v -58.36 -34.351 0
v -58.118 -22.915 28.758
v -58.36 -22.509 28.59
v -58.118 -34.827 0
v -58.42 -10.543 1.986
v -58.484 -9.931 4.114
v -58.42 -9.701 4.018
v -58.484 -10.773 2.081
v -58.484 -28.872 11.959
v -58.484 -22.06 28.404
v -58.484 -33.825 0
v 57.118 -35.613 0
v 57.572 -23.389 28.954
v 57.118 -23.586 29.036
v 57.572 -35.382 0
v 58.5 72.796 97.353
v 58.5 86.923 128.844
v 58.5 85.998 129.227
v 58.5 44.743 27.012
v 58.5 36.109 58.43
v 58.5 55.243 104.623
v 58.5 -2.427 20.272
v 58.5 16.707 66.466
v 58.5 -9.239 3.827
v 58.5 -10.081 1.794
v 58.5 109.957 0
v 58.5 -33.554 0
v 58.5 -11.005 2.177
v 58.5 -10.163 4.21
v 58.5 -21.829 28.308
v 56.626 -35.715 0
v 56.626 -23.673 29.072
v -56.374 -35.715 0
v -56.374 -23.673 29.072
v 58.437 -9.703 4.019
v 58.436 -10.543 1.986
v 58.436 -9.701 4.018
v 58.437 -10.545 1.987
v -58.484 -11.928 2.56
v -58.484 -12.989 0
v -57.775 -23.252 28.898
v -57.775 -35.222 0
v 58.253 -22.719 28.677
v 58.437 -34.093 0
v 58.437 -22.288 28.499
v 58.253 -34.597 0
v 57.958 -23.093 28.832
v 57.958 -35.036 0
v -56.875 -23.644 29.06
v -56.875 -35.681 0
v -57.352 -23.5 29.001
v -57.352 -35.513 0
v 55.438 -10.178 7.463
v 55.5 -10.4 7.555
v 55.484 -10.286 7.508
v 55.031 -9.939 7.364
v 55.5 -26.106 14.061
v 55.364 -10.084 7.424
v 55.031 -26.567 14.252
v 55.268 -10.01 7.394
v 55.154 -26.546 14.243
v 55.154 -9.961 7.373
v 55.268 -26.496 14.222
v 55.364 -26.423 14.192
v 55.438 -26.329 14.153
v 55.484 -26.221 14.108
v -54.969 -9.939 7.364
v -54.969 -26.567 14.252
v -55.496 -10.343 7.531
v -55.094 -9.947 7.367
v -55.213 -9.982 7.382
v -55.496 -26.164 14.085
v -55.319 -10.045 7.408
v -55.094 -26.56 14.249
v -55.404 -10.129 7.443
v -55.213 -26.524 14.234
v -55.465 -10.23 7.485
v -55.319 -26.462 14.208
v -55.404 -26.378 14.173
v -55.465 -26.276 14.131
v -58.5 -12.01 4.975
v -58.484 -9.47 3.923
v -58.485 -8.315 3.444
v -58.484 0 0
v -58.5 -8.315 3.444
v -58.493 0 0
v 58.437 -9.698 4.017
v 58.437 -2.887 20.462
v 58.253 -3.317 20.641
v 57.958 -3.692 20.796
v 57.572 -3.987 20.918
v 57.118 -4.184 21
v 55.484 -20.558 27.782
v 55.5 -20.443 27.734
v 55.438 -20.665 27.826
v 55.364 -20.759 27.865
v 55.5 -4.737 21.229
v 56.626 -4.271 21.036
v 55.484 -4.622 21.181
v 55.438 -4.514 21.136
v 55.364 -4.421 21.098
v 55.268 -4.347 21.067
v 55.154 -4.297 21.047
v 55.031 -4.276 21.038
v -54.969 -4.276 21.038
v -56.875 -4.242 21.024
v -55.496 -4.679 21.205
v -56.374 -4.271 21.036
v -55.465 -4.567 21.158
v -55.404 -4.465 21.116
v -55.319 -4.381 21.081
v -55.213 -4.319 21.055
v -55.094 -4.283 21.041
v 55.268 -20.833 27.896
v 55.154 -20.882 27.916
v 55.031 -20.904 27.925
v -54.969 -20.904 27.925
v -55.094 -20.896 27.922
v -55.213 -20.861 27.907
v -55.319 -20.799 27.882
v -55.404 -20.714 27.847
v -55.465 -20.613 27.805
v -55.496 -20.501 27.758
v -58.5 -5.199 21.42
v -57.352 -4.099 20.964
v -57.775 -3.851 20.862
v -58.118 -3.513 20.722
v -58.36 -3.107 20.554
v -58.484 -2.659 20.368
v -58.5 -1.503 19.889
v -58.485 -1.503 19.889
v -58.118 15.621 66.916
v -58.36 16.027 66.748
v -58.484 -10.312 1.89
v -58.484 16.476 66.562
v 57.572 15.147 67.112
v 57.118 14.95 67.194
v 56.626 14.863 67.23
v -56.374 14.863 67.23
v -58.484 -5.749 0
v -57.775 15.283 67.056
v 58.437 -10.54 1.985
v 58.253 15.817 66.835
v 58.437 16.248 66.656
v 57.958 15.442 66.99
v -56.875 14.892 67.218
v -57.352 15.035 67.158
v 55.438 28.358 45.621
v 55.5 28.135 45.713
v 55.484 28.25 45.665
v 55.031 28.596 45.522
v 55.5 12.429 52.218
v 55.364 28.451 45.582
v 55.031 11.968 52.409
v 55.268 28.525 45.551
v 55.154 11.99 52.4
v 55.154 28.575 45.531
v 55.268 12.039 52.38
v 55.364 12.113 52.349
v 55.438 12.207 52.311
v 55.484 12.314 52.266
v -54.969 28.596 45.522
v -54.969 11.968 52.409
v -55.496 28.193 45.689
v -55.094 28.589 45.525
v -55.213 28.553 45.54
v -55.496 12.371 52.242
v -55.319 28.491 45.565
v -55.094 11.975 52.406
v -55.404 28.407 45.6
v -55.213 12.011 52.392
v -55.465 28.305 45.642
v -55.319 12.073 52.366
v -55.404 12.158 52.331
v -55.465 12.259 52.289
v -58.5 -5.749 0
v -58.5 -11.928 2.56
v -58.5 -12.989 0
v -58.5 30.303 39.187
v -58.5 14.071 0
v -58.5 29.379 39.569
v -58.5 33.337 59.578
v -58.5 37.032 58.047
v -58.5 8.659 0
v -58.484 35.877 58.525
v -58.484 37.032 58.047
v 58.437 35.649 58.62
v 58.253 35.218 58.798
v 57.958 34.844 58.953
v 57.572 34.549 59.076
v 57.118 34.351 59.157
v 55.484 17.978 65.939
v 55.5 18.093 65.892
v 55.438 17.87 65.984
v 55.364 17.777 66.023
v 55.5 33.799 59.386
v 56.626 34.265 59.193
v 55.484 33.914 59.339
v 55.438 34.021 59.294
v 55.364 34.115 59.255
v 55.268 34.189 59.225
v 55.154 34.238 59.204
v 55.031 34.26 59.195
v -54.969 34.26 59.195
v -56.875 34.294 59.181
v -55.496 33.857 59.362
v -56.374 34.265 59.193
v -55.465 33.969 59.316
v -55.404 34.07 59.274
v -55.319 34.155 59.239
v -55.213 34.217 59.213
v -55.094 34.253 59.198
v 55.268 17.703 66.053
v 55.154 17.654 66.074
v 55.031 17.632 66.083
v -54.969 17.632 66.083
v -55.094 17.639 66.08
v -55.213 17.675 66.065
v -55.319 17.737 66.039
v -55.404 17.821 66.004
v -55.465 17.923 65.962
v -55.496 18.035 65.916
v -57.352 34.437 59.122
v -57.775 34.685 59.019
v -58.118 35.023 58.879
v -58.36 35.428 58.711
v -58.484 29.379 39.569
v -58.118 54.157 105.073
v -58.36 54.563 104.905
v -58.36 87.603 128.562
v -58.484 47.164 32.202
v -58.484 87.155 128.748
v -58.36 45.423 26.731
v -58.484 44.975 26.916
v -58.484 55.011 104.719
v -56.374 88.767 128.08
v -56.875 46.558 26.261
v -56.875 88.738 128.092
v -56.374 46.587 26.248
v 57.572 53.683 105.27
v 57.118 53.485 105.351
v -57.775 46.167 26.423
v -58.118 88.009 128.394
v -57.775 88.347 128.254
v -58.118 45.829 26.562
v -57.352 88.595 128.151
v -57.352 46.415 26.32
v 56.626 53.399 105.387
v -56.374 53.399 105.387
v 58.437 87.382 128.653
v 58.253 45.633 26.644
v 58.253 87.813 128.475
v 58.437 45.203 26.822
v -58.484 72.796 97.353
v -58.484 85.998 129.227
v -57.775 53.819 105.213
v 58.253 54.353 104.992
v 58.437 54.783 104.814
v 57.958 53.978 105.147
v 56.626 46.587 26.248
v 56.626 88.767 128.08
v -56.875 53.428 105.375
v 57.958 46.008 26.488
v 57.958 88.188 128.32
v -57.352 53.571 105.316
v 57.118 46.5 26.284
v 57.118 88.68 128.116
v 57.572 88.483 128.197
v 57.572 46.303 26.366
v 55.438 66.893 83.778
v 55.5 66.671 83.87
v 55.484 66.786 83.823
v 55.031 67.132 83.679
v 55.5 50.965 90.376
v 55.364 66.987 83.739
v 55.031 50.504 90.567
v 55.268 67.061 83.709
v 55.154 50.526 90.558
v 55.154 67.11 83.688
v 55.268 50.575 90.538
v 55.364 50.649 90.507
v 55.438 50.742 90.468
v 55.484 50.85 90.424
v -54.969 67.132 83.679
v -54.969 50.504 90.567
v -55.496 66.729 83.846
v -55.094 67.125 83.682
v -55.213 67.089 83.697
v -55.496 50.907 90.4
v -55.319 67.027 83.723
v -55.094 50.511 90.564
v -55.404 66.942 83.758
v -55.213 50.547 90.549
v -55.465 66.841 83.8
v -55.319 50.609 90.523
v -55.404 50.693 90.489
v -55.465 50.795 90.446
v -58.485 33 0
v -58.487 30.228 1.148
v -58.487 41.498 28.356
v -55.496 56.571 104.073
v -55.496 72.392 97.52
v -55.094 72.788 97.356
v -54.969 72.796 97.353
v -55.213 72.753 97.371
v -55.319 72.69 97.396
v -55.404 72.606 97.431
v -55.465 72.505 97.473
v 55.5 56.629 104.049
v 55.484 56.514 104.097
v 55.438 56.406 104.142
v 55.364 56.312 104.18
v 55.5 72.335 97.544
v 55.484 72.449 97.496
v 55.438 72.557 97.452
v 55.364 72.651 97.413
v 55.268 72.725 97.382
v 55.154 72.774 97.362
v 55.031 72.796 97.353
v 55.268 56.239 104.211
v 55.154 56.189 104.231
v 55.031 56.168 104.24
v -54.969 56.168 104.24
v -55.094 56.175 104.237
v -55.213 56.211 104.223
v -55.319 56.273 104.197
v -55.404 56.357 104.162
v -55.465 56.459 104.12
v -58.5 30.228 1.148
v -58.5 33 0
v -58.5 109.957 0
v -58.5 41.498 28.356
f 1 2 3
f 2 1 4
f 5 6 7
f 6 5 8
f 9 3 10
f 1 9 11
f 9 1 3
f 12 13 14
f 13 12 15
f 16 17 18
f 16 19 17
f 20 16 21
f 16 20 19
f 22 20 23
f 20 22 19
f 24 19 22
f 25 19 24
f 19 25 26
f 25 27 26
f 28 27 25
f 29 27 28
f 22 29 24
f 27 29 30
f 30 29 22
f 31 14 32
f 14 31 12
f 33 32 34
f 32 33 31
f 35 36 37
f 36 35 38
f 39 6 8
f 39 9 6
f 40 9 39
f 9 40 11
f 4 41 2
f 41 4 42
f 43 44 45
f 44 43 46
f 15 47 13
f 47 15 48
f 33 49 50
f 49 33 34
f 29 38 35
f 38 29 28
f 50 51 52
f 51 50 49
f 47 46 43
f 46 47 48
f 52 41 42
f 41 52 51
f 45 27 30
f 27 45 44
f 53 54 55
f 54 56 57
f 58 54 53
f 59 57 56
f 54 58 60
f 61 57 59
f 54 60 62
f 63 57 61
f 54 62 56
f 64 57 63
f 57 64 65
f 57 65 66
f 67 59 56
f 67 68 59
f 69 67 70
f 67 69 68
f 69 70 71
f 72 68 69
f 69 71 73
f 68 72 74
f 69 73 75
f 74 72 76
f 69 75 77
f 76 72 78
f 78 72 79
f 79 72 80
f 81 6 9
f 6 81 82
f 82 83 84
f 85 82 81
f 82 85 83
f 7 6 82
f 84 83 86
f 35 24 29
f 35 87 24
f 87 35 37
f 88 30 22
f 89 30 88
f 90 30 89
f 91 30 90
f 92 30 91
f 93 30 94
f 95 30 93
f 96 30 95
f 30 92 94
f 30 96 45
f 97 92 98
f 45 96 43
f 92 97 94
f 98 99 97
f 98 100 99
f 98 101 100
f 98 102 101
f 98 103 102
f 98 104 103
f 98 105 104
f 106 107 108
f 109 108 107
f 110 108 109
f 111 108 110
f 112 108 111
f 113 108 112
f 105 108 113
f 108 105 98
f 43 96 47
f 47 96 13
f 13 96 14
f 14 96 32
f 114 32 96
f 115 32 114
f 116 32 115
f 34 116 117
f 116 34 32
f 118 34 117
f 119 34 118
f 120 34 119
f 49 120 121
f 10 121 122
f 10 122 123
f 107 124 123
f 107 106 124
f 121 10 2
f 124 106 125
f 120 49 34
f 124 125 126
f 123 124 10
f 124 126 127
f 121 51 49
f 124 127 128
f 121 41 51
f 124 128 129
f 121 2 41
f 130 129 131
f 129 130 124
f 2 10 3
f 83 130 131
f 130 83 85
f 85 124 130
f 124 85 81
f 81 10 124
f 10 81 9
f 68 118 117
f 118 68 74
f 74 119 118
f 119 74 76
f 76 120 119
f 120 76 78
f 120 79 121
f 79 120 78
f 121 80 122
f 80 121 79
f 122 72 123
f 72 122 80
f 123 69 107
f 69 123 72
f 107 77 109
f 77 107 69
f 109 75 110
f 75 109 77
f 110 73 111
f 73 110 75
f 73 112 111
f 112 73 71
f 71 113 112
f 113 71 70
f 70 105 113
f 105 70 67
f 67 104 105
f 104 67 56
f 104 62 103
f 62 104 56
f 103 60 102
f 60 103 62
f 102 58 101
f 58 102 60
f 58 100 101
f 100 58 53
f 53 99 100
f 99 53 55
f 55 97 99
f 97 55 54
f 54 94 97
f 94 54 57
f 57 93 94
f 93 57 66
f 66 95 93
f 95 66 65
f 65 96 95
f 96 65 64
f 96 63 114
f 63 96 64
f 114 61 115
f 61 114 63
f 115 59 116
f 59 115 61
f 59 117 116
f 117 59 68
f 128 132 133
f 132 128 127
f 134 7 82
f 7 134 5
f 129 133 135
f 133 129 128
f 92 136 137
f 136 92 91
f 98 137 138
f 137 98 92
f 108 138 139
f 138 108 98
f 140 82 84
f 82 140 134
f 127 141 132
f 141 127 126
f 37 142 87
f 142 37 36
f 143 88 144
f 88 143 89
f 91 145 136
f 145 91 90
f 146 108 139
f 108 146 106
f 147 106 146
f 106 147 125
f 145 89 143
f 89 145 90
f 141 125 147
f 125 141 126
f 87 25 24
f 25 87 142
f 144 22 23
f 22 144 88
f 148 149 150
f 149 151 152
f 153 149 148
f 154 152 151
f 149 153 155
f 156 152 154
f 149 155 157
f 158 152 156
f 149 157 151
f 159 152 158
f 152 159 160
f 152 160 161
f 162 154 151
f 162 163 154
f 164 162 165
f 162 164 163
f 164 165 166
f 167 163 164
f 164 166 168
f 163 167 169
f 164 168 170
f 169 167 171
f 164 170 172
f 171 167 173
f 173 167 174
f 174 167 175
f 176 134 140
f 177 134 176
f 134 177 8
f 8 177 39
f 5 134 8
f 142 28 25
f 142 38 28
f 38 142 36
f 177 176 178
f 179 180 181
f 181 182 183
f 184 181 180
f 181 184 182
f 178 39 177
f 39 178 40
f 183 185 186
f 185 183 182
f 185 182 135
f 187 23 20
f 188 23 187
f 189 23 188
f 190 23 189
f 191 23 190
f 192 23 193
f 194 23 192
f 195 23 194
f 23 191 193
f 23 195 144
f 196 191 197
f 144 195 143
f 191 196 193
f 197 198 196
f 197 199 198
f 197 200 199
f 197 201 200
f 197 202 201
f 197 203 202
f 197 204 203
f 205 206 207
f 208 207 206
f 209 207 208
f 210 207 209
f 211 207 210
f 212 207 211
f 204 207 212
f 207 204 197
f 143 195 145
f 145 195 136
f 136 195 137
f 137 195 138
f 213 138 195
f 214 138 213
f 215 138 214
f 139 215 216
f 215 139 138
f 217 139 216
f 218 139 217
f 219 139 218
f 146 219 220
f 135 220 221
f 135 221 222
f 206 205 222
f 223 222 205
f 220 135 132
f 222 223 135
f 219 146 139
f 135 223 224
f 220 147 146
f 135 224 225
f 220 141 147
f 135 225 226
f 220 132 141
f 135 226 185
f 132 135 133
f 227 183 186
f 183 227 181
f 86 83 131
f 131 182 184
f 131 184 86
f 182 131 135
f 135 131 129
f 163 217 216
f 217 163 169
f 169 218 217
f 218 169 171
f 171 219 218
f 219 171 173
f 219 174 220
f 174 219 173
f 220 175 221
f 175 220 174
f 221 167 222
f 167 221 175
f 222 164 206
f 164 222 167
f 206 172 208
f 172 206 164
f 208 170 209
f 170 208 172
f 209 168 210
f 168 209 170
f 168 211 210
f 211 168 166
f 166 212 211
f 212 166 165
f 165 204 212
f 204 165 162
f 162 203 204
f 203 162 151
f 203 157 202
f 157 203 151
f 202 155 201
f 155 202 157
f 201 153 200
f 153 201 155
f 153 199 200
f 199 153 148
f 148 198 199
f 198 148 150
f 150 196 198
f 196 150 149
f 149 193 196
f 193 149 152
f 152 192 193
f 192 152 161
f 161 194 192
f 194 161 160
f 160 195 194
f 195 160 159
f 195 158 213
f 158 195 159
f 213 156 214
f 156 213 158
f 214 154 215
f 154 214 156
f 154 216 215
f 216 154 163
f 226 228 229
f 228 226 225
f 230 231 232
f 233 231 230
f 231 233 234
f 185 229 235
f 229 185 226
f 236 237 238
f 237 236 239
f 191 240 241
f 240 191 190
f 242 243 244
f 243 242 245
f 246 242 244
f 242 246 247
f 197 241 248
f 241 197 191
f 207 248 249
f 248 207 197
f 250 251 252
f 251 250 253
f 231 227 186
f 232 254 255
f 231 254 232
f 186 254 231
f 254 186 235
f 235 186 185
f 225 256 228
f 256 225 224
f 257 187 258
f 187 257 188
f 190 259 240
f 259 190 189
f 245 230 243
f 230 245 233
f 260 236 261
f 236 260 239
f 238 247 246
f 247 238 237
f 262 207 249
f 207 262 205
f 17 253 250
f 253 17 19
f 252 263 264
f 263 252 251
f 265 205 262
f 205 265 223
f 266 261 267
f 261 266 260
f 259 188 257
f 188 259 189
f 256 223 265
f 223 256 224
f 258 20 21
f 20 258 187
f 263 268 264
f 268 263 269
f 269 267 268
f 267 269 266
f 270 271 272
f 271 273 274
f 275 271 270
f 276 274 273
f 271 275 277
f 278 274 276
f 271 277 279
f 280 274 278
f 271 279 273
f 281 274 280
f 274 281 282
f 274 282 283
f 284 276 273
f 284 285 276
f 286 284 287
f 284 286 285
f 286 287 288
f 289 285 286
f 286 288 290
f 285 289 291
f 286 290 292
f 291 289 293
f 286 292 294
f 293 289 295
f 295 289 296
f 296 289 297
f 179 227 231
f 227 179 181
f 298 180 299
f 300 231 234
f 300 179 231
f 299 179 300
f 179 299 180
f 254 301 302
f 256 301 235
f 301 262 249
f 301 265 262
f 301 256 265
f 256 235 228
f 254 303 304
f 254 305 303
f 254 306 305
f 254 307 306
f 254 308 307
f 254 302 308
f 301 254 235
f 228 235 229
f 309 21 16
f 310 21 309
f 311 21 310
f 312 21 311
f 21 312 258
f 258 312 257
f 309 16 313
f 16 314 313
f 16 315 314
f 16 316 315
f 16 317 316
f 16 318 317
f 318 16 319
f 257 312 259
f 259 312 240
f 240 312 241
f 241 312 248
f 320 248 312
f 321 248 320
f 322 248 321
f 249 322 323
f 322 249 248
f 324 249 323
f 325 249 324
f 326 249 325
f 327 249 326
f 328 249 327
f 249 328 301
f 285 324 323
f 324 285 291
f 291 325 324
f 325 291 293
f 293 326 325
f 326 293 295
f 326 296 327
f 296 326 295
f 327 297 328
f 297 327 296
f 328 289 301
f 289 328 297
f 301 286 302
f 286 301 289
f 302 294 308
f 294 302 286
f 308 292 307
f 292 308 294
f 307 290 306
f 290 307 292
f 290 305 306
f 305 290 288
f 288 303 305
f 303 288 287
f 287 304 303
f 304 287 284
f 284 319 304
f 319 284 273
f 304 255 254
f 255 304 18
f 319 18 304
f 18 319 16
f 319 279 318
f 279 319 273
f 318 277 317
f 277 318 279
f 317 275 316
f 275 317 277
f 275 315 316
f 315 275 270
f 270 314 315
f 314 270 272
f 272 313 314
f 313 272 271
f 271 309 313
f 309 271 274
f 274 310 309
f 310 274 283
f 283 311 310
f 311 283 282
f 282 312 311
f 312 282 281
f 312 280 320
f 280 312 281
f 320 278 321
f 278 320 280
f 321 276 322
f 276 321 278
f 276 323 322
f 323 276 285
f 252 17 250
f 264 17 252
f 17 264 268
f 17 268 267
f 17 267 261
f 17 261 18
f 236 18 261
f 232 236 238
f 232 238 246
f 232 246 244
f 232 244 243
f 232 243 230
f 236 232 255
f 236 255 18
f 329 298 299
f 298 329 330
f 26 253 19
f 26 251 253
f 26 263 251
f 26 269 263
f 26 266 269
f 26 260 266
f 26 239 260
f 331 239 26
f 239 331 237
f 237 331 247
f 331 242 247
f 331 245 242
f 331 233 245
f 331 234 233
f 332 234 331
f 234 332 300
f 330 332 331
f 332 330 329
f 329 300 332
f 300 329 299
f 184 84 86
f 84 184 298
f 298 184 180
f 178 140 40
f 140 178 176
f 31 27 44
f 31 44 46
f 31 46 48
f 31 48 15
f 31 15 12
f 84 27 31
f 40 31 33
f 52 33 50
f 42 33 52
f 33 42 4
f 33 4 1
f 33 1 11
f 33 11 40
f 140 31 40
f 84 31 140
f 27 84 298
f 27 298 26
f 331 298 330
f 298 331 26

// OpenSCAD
// file: cartholder.scad
PRECISION = 25;

module hulled_cart(size, thickness, front_square=false, rear_square=false) {
    // draw a cart including a square or circle hull
    hull() {
        square([size[1], size[2]]); // cart
        // place a circle or square in each corner
        color("blue")
        for (corner_i = [0, 1]) {
            for (corner_j = [0, 1]) {
                translate([corner_i*size[1] + (corner_i*2-1)*thickness/2,
                           corner_j*size[2] + (corner_j*2-1)*thickness/2]) {
                    // square or circle, depending on front or rear
                    if (   (corner_j == 0 && front_square)
                        || (corner_j == 1 && rear_square)) {
                        square(thickness, center=true);
                    } else {
                        circle(thickness/2, $fn=PRECISION);
                    }
                }
            }
        }
    }
}

module hulled_cart_border(size, spacing, thickness, front_square=false, rear_square=false, rear_only=false) {
    // draw only the border of a cart (of thickness)
    difference() {
        hulled_cart(size, spacing+thickness, front_square=front_square, rear_square=rear_square);
        if (!rear_only) {
            hulled_cart(size, spacing);
        } else {
            translate([-(thickness + spacing), -(thickness + spacing), 0])
            hulled_cart([size[0], size[1]+thickness*2+spacing*2, size[2]+thickness+spacing], spacing);
        }
    }
}

module cartholder_part(size, spacing, thickness, visibility, raise, delta, front, rear, rear_visibility, extend_down=20, show_carts=false) {
    // there are three sections:
    // filled
    translate([0, 0, -extend_down]) {
        linear_extrude(raise+thickness + extend_down) {
            hulled_cart(size, spacing+thickness);
        }
        // with cart hole and front square, up to the height of the previous cart holder
        if (!front) {
            linear_extrude(raise-delta+thickness+spacing+size[0] * (1-visibility)) {
                hulled_cart_border(size, spacing, thickness, front_square=!front, rear_square=!rear);
            };
        }
    }
    // and the rest, up to visibility
    linear_extrude(raise+thickness + spacing + size[0] * (1-visibility)) {
        hulled_cart_border(size, spacing, thickness, rear_square=!rear);
    };
    if (rear) {
        linear_extrude(raise+thickness + spacing + size[0] * (1-rear_visibility)) {
            hulled_cart_border(size, spacing, thickness, rear_square=!rear, rear_only=true);
        };
    }
    
    if (show_carts) {
        // draw a fake cart
        translate([0, 0, raise])
        color("gray") render() color("gray") cube([size[1], size[2], size[0]]);
    }
}

module cartholder(size=[85, 54, 1], thickness=3, spacing=1, carts=4, delta=25, visibility=0.8, rear_visibility=0.3, angle=22.5, crop_bottom=true, show_carts=false) {
    // hard conditions in the assignment
    if (len(size) > 1
        && size[0] > 0 && size[1] > 0
        && carts > 0) {
        // make sure size is 3-tuple
        size_ = [size[0], size[1], len(size) < 3 ? 0 : size[2]];
        // clamp the visibility, thickness, and spacnig
        visibility_ = visibility < 0 ? 0 : visibility > 1 ? 1 : visibility;
        thickness_  = thickness  < 0 ? 0 : thickness;
        spacing_    = spacing    < 0 ? 0 : spacing;
        // use an absolute delta
        delta_ = abs(delta);
        // prepare for rotation if delta is negative
        rot = delta < 0;
        // calculate the width and length so the structure can be centered.
        holder_width = thickness_*2 + spacing_*2 + size_[1];
        holder_length = (thickness_ + spacing_*2 + size_[2]) * carts + thickness_;
        // I only used this to verify
        holder_height = (delta_*(carts-1))  + (thickness_ + spacing_ + size_[0] * (1-visibility_));
        
        // this is crude: we cut off the parts of the cartholder
        // that end up under ground
        difference() {
            union() {
                // rotate if delta was negative
                rotate([0, 0, rot ? 180 : 0])
                // lay the cart holder down
                rotate([-angle, 0, 0])
                // center the cart holder as requested
                translate([-holder_width/2, -holder_length/2, 0]) {
                    // for each cart
                    for (i = [0 : carts-1]) {
                        // render the cart holder part, including the filled part from
                        // the ground, properly shifted so that it overlays the previous
                        // cart holder part's rear thickness.
                        translate([thickness_+spacing_, thickness_+spacing_+i*(thickness_+spacing_*2+size_[2]), 0])
                            cartholder_part(size_, spacing_, thickness_, visibility_, delta_*i,
                            delta_,
                            front = i == 0,
                            rear  = i == carts-1,
                            rear_visibility = rear_visibility,
                            show_carts = show_carts);
                    }
                };
                
                if (angle) {
                    // add a back stand for stability
                    translate([-holder_width/2, holder_length/2, 0])
                    rotate([-angle, 0, 0])
                    translate([0, -thickness, 0])
                    cube([holder_width, holder_height, holder_height/4]);
                }
            }
            
            if (crop_bottom) {
                // a huge cube under the cartholder
                color("red") translate([-500, -500, -1000]) cube([1000, 1000, 1000]);
            }
            
        }
        
   }
}

show_carts = true;
angle = 22.5;

cartholder([65, 57, 7.5], thickness=3, spacing=1, carts=4, delta=25, visibility=0.8, angle=angle, rear_visibility=0.3, crop_bottom=true, show_carts=show_carts);
// main file
use <cartholder.scad>

DEBUG = false;

cartridge_dimensions = [69, 109, 16];

cartholder(cartridge_dimensions, show_carts=DEBUG, crop_bottom=!DEBUG, delta=50, carts=3);
